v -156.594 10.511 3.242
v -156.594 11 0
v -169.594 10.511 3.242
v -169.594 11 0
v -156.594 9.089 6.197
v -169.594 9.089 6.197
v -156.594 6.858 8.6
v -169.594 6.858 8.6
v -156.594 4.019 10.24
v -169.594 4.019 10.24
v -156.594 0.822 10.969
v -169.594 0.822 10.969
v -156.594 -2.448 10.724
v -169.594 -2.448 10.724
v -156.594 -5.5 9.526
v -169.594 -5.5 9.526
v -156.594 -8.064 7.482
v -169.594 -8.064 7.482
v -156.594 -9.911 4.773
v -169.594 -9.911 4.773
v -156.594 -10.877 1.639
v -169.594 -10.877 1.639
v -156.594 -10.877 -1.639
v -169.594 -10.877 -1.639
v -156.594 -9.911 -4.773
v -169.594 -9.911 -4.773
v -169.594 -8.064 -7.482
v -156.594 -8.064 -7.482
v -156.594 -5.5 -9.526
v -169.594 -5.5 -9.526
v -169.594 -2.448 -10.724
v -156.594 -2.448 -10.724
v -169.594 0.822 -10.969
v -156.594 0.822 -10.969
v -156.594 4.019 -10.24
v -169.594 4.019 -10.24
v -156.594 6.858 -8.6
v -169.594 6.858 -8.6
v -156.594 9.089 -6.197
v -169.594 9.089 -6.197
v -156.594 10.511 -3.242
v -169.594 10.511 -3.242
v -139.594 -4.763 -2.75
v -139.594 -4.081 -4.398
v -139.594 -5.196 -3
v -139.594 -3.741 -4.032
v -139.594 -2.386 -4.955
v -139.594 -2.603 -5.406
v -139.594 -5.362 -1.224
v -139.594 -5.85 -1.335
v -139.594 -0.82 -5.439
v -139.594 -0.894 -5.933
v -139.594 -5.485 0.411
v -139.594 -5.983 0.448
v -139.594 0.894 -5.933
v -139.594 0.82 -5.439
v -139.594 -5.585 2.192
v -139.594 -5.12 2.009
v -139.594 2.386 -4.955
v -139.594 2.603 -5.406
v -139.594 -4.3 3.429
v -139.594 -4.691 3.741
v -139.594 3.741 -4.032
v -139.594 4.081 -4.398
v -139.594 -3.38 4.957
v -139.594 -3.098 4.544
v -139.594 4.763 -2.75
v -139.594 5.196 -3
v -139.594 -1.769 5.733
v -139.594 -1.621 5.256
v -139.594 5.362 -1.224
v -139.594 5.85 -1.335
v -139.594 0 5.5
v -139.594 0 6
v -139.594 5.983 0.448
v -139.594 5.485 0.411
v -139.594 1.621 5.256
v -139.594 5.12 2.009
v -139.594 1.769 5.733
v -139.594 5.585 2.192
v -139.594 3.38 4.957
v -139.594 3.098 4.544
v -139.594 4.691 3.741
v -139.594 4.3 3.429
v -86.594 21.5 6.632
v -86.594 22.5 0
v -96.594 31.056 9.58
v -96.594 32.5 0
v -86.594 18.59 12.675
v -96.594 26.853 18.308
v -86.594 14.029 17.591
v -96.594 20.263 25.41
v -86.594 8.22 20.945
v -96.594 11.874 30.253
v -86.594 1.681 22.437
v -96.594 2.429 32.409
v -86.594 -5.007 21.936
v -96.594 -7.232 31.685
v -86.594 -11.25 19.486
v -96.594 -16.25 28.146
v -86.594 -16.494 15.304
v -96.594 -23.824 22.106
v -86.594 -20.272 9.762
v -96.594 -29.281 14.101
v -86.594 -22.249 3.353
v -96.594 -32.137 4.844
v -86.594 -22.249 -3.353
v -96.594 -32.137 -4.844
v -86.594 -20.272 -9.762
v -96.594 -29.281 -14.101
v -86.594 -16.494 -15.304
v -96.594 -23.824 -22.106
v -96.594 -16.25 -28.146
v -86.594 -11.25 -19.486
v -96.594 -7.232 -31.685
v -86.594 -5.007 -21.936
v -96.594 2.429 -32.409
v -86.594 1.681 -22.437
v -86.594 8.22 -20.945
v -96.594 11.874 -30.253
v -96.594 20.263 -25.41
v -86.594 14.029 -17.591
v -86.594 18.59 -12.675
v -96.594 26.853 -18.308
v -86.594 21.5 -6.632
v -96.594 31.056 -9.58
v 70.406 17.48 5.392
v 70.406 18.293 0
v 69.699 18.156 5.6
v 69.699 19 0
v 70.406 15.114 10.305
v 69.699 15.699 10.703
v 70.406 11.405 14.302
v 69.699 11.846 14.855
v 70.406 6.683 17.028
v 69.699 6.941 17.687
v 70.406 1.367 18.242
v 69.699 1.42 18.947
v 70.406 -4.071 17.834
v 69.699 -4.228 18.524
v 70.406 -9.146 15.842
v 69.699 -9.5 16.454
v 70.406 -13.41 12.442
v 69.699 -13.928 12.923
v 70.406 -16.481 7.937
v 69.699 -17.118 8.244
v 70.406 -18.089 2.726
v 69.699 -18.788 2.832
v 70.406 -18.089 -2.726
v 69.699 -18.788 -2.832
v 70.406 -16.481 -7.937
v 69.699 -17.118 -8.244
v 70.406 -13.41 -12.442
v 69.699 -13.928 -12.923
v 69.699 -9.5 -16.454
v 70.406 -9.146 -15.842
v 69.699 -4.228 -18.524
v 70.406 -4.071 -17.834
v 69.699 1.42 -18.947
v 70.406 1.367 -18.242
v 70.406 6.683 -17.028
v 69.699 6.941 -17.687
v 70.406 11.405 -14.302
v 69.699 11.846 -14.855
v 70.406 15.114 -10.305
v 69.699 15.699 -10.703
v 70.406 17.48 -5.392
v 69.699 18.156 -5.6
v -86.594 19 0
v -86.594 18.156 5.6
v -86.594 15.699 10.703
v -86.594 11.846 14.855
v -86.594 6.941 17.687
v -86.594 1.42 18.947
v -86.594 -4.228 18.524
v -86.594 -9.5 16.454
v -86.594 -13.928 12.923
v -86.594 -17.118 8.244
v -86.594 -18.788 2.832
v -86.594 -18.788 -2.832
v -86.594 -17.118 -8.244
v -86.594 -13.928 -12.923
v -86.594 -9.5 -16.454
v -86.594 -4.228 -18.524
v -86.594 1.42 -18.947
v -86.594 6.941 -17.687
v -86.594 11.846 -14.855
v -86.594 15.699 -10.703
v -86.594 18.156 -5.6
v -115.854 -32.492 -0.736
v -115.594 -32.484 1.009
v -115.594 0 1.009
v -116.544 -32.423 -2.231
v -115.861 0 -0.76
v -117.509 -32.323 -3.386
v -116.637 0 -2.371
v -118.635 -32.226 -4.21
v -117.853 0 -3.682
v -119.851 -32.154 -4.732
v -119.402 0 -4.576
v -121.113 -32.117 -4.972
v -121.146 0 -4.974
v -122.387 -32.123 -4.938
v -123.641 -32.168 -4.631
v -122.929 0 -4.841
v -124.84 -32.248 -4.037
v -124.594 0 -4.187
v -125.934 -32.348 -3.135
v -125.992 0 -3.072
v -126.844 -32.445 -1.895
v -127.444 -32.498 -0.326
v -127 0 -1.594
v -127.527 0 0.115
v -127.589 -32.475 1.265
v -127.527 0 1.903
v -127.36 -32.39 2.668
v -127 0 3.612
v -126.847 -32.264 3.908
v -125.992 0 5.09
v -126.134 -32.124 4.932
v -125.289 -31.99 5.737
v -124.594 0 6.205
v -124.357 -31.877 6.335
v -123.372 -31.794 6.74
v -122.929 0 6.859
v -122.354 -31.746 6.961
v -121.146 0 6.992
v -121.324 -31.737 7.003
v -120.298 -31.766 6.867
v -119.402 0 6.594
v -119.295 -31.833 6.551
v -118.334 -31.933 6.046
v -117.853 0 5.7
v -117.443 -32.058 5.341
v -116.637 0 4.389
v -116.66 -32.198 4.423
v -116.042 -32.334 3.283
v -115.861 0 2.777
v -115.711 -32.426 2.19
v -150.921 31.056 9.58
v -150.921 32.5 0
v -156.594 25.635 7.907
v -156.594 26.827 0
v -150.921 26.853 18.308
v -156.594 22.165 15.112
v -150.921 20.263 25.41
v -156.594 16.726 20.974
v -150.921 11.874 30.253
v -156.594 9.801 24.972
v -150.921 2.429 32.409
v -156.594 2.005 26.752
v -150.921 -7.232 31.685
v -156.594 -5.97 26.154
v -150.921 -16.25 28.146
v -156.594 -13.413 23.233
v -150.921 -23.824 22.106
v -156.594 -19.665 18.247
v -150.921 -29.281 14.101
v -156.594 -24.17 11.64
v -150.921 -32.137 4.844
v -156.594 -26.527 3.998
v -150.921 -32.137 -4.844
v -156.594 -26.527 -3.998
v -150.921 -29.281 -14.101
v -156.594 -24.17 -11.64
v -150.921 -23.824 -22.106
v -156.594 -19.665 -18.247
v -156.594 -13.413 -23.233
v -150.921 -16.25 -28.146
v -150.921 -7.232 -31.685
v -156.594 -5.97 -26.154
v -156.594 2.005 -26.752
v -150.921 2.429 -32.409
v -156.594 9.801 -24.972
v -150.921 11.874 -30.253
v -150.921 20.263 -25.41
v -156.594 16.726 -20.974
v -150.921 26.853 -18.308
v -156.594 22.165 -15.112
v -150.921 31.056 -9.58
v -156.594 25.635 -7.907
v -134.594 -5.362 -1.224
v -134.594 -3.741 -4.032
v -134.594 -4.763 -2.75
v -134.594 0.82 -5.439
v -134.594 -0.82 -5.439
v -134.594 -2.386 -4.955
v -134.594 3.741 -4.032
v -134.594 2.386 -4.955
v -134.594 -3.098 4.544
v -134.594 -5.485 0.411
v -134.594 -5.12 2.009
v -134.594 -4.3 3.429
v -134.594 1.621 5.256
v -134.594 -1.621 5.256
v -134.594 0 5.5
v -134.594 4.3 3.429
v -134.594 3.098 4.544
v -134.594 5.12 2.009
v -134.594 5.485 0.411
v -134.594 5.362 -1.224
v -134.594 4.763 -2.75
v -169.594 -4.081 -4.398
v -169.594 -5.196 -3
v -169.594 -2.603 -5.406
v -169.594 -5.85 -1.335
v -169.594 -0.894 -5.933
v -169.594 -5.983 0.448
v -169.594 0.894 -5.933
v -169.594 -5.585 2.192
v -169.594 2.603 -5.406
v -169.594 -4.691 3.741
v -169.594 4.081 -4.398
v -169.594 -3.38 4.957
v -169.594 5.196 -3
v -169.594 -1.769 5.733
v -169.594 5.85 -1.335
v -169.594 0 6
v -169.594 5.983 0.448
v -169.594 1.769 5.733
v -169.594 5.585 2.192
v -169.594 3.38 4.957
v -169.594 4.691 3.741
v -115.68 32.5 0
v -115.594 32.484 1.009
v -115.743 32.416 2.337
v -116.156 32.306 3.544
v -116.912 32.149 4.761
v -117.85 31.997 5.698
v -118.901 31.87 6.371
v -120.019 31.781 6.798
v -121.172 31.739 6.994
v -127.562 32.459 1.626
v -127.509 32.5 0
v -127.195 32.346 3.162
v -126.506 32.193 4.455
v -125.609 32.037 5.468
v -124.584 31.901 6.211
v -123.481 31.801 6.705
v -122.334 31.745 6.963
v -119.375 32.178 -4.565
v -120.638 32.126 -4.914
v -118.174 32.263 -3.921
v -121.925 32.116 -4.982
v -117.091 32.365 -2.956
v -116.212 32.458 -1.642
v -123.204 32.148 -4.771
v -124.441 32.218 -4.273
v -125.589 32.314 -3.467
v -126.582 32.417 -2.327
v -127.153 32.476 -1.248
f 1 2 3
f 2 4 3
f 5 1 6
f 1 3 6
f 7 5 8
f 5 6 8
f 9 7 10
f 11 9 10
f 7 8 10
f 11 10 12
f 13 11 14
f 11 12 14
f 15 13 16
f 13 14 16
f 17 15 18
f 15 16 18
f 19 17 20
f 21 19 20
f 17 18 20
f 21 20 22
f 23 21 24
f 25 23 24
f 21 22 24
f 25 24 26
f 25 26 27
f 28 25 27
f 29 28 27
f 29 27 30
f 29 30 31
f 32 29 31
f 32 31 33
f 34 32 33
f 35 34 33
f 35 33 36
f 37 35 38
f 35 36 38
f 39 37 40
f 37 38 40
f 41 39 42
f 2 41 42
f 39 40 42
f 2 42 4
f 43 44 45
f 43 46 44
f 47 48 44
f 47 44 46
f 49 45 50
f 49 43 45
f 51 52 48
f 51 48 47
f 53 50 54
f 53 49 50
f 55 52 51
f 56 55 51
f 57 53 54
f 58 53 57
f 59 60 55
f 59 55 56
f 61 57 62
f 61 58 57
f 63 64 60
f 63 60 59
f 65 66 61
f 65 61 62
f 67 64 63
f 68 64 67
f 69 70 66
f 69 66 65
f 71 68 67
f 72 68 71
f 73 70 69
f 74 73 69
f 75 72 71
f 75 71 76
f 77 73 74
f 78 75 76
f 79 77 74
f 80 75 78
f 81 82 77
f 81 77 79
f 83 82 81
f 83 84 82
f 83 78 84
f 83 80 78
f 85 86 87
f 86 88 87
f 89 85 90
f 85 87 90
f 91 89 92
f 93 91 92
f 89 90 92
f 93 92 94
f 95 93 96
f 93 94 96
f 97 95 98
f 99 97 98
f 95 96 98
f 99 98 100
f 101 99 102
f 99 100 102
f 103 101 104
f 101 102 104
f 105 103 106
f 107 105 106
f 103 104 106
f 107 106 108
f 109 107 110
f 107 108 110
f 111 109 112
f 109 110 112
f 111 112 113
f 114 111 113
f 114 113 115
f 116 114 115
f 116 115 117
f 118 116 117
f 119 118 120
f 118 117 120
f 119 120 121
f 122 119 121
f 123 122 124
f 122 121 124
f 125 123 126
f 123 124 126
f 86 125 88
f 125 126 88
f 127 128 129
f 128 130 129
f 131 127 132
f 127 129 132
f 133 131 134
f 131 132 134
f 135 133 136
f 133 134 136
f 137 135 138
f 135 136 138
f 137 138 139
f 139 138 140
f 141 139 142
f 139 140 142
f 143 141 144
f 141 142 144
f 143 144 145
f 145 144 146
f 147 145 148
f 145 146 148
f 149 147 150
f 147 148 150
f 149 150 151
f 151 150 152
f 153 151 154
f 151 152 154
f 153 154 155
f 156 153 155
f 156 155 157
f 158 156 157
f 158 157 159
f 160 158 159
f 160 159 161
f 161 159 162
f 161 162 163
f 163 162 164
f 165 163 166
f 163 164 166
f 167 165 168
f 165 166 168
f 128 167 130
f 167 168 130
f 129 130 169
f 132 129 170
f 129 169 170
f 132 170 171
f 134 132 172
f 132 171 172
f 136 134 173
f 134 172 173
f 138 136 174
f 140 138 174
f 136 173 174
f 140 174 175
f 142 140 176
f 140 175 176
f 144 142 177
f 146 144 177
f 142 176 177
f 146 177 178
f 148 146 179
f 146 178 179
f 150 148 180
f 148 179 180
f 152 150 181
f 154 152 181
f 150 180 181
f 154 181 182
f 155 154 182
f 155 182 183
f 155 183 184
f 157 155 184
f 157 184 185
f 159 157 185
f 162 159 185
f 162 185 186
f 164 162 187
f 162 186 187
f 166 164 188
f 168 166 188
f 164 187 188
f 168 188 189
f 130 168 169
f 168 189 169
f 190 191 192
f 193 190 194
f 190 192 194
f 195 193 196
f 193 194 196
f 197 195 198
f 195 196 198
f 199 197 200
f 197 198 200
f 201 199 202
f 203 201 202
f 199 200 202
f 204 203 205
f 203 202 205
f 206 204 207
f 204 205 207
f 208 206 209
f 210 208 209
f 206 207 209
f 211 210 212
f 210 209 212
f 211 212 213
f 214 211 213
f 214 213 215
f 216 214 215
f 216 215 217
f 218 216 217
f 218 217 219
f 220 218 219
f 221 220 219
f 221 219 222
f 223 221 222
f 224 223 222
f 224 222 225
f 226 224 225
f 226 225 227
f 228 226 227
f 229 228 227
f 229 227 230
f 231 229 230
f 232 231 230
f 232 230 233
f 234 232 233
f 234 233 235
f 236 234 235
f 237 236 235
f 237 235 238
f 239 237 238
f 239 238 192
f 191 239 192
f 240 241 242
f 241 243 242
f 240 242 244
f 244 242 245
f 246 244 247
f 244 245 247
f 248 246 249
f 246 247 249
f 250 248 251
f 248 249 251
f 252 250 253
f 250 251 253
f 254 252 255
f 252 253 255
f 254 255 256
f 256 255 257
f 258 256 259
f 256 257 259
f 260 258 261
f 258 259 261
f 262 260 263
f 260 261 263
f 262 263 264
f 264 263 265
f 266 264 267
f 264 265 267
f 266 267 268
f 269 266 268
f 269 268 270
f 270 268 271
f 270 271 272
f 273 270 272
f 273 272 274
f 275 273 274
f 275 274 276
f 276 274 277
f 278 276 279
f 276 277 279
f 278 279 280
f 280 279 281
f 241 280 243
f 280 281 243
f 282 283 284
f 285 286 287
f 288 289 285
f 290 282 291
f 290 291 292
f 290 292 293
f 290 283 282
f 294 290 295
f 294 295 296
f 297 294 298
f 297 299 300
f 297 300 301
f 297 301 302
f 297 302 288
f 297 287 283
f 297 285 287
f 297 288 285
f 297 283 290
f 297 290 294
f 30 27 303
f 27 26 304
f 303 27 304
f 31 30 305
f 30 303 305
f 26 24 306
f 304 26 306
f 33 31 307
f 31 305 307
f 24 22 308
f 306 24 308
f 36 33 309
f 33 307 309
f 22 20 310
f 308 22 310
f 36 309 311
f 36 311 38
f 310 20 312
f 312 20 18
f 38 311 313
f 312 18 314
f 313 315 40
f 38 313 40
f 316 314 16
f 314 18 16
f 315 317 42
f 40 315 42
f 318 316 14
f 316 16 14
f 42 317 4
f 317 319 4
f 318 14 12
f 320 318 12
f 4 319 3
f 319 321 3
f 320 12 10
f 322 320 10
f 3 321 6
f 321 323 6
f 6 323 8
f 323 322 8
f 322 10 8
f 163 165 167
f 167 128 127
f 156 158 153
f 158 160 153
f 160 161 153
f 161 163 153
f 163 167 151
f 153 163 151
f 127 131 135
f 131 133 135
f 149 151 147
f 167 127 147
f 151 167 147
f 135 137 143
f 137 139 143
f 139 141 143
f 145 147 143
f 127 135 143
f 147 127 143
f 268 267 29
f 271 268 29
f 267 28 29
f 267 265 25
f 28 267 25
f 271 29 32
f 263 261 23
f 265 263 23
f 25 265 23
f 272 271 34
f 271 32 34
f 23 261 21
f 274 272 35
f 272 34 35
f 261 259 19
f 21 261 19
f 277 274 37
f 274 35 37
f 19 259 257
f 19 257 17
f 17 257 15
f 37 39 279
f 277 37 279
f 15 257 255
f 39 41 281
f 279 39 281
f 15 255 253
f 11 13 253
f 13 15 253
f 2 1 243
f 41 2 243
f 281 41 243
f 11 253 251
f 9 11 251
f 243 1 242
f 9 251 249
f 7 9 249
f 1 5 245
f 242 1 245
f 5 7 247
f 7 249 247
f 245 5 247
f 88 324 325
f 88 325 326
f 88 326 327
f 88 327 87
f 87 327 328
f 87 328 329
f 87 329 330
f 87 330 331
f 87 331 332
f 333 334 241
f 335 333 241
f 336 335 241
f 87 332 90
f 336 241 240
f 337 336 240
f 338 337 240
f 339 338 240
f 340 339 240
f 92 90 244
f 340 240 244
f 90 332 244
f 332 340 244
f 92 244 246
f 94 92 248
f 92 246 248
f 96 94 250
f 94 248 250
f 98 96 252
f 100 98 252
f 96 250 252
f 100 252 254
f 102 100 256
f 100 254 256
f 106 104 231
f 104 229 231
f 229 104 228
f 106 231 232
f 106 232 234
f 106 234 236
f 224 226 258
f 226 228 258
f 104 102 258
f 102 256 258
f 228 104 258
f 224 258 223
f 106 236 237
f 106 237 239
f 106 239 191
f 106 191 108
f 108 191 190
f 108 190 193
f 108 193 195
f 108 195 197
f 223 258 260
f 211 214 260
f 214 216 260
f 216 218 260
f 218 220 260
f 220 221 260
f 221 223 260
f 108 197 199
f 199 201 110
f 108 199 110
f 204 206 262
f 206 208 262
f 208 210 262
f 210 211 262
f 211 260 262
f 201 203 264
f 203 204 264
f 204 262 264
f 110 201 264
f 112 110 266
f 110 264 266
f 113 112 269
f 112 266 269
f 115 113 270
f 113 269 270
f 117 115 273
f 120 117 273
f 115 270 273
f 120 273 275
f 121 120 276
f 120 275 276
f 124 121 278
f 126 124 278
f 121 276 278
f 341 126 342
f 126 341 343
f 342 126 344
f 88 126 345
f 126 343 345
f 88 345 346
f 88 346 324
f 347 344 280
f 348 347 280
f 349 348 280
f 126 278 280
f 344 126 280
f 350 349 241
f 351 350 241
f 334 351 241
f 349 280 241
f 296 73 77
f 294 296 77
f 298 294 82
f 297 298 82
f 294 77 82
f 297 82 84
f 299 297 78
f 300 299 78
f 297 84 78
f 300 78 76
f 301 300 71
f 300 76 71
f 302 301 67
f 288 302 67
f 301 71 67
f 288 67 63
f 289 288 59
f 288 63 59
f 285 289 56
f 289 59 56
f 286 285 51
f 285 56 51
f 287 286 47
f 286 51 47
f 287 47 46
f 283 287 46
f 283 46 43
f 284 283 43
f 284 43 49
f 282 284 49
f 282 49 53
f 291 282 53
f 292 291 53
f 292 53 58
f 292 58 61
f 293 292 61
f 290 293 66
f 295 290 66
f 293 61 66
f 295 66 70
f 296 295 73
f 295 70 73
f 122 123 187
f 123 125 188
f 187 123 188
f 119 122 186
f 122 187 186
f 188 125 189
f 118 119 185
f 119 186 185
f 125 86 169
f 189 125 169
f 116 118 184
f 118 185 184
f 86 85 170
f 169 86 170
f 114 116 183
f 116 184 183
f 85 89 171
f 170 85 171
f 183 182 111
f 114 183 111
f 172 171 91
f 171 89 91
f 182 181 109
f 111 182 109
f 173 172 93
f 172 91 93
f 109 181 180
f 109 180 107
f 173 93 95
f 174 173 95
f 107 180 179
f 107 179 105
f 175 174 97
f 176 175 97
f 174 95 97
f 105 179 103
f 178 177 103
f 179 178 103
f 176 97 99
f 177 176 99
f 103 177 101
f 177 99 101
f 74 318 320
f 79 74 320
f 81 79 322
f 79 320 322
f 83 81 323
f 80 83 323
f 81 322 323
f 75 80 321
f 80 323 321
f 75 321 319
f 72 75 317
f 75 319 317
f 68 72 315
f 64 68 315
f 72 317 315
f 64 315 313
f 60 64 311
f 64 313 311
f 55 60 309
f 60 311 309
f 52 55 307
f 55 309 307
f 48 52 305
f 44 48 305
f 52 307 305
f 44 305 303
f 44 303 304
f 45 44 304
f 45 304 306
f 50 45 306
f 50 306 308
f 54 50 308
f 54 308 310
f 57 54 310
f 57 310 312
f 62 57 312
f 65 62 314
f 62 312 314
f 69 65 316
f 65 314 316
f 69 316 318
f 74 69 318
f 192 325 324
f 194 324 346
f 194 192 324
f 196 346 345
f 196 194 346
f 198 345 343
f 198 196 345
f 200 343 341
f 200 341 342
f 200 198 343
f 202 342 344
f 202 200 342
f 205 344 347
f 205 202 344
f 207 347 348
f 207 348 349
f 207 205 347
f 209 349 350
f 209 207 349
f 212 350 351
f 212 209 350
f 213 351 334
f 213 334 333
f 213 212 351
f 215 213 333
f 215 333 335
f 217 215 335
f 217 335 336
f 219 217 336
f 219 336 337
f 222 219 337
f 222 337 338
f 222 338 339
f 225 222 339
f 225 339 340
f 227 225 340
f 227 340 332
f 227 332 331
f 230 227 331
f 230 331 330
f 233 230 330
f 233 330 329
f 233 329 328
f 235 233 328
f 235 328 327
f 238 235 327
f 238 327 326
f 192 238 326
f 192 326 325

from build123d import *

# Parameters (mm, degrees)
SKETCH2_R               = 6
CUT_EXTRUDE1_DEPTH      = 33.5
CUT_EXTRUDE1_DEPTH_BACK = 33.5
SKETCH3_R               = 6
CUT_EXTRUDE2_DEPTH      = 30
SKETCH5_R               = 5.5
CUT_EXTRUDE4_DEPTH      = 5


with BuildPart() as part:
    # Sketch1 → Revolve2 (revolve)
    with BuildSketch(Plane.XY):
        Polygon((70.405866489, 0), (70.405866489, 18.292893219), (69.698759708, 19), (-86.594133511, 19), (-86.594133511, 22.5), (-96.594133511, 32.5), (-150.920978651, 32.5), (-156.594133511, 26.82684514), (-156.594133511, 11), (-169.594133511, 11), (-169.594133511, 0), align=None)
    revolve(axis=Axis((-169.594133511, 0, 0), (1, 0, 0)))

    # Sketch2 → Cut-Extrude1 (cut, two sides)
    with BuildSketch(Plane(origin=(0, 0, 0), x_dir=(1, 0, 0), z_dir=(0, 1, 0))) as cut_extrude1_sk:
        with Locations((-121.594133511, -1.00894074)):
            Circle(SKETCH2_R)
    extrude(amount=CUT_EXTRUDE1_DEPTH, mode=Mode.SUBTRACT)
    extrude(cut_extrude1_sk.sketch, amount=-CUT_EXTRUDE1_DEPTH_BACK, mode=Mode.SUBTRACT)

    # Sketch3 → Cut-Extrude2 (cut)
    with BuildSketch(Plane.ZY.offset(169.594133511)):
        Circle(SKETCH3_R)
    extrude(amount=-CUT_EXTRUDE2_DEPTH, mode=Mode.SUBTRACT)

    # Sketch5 → Cut-Extrude4 (cut)
    with BuildSketch(Plane.ZY.offset(139.594133511)):
        Circle(SKETCH5_R)
    extrude(amount=-CUT_EXTRUDE4_DEPTH, mode=Mode.SUBTRACT)


solid = part.part
